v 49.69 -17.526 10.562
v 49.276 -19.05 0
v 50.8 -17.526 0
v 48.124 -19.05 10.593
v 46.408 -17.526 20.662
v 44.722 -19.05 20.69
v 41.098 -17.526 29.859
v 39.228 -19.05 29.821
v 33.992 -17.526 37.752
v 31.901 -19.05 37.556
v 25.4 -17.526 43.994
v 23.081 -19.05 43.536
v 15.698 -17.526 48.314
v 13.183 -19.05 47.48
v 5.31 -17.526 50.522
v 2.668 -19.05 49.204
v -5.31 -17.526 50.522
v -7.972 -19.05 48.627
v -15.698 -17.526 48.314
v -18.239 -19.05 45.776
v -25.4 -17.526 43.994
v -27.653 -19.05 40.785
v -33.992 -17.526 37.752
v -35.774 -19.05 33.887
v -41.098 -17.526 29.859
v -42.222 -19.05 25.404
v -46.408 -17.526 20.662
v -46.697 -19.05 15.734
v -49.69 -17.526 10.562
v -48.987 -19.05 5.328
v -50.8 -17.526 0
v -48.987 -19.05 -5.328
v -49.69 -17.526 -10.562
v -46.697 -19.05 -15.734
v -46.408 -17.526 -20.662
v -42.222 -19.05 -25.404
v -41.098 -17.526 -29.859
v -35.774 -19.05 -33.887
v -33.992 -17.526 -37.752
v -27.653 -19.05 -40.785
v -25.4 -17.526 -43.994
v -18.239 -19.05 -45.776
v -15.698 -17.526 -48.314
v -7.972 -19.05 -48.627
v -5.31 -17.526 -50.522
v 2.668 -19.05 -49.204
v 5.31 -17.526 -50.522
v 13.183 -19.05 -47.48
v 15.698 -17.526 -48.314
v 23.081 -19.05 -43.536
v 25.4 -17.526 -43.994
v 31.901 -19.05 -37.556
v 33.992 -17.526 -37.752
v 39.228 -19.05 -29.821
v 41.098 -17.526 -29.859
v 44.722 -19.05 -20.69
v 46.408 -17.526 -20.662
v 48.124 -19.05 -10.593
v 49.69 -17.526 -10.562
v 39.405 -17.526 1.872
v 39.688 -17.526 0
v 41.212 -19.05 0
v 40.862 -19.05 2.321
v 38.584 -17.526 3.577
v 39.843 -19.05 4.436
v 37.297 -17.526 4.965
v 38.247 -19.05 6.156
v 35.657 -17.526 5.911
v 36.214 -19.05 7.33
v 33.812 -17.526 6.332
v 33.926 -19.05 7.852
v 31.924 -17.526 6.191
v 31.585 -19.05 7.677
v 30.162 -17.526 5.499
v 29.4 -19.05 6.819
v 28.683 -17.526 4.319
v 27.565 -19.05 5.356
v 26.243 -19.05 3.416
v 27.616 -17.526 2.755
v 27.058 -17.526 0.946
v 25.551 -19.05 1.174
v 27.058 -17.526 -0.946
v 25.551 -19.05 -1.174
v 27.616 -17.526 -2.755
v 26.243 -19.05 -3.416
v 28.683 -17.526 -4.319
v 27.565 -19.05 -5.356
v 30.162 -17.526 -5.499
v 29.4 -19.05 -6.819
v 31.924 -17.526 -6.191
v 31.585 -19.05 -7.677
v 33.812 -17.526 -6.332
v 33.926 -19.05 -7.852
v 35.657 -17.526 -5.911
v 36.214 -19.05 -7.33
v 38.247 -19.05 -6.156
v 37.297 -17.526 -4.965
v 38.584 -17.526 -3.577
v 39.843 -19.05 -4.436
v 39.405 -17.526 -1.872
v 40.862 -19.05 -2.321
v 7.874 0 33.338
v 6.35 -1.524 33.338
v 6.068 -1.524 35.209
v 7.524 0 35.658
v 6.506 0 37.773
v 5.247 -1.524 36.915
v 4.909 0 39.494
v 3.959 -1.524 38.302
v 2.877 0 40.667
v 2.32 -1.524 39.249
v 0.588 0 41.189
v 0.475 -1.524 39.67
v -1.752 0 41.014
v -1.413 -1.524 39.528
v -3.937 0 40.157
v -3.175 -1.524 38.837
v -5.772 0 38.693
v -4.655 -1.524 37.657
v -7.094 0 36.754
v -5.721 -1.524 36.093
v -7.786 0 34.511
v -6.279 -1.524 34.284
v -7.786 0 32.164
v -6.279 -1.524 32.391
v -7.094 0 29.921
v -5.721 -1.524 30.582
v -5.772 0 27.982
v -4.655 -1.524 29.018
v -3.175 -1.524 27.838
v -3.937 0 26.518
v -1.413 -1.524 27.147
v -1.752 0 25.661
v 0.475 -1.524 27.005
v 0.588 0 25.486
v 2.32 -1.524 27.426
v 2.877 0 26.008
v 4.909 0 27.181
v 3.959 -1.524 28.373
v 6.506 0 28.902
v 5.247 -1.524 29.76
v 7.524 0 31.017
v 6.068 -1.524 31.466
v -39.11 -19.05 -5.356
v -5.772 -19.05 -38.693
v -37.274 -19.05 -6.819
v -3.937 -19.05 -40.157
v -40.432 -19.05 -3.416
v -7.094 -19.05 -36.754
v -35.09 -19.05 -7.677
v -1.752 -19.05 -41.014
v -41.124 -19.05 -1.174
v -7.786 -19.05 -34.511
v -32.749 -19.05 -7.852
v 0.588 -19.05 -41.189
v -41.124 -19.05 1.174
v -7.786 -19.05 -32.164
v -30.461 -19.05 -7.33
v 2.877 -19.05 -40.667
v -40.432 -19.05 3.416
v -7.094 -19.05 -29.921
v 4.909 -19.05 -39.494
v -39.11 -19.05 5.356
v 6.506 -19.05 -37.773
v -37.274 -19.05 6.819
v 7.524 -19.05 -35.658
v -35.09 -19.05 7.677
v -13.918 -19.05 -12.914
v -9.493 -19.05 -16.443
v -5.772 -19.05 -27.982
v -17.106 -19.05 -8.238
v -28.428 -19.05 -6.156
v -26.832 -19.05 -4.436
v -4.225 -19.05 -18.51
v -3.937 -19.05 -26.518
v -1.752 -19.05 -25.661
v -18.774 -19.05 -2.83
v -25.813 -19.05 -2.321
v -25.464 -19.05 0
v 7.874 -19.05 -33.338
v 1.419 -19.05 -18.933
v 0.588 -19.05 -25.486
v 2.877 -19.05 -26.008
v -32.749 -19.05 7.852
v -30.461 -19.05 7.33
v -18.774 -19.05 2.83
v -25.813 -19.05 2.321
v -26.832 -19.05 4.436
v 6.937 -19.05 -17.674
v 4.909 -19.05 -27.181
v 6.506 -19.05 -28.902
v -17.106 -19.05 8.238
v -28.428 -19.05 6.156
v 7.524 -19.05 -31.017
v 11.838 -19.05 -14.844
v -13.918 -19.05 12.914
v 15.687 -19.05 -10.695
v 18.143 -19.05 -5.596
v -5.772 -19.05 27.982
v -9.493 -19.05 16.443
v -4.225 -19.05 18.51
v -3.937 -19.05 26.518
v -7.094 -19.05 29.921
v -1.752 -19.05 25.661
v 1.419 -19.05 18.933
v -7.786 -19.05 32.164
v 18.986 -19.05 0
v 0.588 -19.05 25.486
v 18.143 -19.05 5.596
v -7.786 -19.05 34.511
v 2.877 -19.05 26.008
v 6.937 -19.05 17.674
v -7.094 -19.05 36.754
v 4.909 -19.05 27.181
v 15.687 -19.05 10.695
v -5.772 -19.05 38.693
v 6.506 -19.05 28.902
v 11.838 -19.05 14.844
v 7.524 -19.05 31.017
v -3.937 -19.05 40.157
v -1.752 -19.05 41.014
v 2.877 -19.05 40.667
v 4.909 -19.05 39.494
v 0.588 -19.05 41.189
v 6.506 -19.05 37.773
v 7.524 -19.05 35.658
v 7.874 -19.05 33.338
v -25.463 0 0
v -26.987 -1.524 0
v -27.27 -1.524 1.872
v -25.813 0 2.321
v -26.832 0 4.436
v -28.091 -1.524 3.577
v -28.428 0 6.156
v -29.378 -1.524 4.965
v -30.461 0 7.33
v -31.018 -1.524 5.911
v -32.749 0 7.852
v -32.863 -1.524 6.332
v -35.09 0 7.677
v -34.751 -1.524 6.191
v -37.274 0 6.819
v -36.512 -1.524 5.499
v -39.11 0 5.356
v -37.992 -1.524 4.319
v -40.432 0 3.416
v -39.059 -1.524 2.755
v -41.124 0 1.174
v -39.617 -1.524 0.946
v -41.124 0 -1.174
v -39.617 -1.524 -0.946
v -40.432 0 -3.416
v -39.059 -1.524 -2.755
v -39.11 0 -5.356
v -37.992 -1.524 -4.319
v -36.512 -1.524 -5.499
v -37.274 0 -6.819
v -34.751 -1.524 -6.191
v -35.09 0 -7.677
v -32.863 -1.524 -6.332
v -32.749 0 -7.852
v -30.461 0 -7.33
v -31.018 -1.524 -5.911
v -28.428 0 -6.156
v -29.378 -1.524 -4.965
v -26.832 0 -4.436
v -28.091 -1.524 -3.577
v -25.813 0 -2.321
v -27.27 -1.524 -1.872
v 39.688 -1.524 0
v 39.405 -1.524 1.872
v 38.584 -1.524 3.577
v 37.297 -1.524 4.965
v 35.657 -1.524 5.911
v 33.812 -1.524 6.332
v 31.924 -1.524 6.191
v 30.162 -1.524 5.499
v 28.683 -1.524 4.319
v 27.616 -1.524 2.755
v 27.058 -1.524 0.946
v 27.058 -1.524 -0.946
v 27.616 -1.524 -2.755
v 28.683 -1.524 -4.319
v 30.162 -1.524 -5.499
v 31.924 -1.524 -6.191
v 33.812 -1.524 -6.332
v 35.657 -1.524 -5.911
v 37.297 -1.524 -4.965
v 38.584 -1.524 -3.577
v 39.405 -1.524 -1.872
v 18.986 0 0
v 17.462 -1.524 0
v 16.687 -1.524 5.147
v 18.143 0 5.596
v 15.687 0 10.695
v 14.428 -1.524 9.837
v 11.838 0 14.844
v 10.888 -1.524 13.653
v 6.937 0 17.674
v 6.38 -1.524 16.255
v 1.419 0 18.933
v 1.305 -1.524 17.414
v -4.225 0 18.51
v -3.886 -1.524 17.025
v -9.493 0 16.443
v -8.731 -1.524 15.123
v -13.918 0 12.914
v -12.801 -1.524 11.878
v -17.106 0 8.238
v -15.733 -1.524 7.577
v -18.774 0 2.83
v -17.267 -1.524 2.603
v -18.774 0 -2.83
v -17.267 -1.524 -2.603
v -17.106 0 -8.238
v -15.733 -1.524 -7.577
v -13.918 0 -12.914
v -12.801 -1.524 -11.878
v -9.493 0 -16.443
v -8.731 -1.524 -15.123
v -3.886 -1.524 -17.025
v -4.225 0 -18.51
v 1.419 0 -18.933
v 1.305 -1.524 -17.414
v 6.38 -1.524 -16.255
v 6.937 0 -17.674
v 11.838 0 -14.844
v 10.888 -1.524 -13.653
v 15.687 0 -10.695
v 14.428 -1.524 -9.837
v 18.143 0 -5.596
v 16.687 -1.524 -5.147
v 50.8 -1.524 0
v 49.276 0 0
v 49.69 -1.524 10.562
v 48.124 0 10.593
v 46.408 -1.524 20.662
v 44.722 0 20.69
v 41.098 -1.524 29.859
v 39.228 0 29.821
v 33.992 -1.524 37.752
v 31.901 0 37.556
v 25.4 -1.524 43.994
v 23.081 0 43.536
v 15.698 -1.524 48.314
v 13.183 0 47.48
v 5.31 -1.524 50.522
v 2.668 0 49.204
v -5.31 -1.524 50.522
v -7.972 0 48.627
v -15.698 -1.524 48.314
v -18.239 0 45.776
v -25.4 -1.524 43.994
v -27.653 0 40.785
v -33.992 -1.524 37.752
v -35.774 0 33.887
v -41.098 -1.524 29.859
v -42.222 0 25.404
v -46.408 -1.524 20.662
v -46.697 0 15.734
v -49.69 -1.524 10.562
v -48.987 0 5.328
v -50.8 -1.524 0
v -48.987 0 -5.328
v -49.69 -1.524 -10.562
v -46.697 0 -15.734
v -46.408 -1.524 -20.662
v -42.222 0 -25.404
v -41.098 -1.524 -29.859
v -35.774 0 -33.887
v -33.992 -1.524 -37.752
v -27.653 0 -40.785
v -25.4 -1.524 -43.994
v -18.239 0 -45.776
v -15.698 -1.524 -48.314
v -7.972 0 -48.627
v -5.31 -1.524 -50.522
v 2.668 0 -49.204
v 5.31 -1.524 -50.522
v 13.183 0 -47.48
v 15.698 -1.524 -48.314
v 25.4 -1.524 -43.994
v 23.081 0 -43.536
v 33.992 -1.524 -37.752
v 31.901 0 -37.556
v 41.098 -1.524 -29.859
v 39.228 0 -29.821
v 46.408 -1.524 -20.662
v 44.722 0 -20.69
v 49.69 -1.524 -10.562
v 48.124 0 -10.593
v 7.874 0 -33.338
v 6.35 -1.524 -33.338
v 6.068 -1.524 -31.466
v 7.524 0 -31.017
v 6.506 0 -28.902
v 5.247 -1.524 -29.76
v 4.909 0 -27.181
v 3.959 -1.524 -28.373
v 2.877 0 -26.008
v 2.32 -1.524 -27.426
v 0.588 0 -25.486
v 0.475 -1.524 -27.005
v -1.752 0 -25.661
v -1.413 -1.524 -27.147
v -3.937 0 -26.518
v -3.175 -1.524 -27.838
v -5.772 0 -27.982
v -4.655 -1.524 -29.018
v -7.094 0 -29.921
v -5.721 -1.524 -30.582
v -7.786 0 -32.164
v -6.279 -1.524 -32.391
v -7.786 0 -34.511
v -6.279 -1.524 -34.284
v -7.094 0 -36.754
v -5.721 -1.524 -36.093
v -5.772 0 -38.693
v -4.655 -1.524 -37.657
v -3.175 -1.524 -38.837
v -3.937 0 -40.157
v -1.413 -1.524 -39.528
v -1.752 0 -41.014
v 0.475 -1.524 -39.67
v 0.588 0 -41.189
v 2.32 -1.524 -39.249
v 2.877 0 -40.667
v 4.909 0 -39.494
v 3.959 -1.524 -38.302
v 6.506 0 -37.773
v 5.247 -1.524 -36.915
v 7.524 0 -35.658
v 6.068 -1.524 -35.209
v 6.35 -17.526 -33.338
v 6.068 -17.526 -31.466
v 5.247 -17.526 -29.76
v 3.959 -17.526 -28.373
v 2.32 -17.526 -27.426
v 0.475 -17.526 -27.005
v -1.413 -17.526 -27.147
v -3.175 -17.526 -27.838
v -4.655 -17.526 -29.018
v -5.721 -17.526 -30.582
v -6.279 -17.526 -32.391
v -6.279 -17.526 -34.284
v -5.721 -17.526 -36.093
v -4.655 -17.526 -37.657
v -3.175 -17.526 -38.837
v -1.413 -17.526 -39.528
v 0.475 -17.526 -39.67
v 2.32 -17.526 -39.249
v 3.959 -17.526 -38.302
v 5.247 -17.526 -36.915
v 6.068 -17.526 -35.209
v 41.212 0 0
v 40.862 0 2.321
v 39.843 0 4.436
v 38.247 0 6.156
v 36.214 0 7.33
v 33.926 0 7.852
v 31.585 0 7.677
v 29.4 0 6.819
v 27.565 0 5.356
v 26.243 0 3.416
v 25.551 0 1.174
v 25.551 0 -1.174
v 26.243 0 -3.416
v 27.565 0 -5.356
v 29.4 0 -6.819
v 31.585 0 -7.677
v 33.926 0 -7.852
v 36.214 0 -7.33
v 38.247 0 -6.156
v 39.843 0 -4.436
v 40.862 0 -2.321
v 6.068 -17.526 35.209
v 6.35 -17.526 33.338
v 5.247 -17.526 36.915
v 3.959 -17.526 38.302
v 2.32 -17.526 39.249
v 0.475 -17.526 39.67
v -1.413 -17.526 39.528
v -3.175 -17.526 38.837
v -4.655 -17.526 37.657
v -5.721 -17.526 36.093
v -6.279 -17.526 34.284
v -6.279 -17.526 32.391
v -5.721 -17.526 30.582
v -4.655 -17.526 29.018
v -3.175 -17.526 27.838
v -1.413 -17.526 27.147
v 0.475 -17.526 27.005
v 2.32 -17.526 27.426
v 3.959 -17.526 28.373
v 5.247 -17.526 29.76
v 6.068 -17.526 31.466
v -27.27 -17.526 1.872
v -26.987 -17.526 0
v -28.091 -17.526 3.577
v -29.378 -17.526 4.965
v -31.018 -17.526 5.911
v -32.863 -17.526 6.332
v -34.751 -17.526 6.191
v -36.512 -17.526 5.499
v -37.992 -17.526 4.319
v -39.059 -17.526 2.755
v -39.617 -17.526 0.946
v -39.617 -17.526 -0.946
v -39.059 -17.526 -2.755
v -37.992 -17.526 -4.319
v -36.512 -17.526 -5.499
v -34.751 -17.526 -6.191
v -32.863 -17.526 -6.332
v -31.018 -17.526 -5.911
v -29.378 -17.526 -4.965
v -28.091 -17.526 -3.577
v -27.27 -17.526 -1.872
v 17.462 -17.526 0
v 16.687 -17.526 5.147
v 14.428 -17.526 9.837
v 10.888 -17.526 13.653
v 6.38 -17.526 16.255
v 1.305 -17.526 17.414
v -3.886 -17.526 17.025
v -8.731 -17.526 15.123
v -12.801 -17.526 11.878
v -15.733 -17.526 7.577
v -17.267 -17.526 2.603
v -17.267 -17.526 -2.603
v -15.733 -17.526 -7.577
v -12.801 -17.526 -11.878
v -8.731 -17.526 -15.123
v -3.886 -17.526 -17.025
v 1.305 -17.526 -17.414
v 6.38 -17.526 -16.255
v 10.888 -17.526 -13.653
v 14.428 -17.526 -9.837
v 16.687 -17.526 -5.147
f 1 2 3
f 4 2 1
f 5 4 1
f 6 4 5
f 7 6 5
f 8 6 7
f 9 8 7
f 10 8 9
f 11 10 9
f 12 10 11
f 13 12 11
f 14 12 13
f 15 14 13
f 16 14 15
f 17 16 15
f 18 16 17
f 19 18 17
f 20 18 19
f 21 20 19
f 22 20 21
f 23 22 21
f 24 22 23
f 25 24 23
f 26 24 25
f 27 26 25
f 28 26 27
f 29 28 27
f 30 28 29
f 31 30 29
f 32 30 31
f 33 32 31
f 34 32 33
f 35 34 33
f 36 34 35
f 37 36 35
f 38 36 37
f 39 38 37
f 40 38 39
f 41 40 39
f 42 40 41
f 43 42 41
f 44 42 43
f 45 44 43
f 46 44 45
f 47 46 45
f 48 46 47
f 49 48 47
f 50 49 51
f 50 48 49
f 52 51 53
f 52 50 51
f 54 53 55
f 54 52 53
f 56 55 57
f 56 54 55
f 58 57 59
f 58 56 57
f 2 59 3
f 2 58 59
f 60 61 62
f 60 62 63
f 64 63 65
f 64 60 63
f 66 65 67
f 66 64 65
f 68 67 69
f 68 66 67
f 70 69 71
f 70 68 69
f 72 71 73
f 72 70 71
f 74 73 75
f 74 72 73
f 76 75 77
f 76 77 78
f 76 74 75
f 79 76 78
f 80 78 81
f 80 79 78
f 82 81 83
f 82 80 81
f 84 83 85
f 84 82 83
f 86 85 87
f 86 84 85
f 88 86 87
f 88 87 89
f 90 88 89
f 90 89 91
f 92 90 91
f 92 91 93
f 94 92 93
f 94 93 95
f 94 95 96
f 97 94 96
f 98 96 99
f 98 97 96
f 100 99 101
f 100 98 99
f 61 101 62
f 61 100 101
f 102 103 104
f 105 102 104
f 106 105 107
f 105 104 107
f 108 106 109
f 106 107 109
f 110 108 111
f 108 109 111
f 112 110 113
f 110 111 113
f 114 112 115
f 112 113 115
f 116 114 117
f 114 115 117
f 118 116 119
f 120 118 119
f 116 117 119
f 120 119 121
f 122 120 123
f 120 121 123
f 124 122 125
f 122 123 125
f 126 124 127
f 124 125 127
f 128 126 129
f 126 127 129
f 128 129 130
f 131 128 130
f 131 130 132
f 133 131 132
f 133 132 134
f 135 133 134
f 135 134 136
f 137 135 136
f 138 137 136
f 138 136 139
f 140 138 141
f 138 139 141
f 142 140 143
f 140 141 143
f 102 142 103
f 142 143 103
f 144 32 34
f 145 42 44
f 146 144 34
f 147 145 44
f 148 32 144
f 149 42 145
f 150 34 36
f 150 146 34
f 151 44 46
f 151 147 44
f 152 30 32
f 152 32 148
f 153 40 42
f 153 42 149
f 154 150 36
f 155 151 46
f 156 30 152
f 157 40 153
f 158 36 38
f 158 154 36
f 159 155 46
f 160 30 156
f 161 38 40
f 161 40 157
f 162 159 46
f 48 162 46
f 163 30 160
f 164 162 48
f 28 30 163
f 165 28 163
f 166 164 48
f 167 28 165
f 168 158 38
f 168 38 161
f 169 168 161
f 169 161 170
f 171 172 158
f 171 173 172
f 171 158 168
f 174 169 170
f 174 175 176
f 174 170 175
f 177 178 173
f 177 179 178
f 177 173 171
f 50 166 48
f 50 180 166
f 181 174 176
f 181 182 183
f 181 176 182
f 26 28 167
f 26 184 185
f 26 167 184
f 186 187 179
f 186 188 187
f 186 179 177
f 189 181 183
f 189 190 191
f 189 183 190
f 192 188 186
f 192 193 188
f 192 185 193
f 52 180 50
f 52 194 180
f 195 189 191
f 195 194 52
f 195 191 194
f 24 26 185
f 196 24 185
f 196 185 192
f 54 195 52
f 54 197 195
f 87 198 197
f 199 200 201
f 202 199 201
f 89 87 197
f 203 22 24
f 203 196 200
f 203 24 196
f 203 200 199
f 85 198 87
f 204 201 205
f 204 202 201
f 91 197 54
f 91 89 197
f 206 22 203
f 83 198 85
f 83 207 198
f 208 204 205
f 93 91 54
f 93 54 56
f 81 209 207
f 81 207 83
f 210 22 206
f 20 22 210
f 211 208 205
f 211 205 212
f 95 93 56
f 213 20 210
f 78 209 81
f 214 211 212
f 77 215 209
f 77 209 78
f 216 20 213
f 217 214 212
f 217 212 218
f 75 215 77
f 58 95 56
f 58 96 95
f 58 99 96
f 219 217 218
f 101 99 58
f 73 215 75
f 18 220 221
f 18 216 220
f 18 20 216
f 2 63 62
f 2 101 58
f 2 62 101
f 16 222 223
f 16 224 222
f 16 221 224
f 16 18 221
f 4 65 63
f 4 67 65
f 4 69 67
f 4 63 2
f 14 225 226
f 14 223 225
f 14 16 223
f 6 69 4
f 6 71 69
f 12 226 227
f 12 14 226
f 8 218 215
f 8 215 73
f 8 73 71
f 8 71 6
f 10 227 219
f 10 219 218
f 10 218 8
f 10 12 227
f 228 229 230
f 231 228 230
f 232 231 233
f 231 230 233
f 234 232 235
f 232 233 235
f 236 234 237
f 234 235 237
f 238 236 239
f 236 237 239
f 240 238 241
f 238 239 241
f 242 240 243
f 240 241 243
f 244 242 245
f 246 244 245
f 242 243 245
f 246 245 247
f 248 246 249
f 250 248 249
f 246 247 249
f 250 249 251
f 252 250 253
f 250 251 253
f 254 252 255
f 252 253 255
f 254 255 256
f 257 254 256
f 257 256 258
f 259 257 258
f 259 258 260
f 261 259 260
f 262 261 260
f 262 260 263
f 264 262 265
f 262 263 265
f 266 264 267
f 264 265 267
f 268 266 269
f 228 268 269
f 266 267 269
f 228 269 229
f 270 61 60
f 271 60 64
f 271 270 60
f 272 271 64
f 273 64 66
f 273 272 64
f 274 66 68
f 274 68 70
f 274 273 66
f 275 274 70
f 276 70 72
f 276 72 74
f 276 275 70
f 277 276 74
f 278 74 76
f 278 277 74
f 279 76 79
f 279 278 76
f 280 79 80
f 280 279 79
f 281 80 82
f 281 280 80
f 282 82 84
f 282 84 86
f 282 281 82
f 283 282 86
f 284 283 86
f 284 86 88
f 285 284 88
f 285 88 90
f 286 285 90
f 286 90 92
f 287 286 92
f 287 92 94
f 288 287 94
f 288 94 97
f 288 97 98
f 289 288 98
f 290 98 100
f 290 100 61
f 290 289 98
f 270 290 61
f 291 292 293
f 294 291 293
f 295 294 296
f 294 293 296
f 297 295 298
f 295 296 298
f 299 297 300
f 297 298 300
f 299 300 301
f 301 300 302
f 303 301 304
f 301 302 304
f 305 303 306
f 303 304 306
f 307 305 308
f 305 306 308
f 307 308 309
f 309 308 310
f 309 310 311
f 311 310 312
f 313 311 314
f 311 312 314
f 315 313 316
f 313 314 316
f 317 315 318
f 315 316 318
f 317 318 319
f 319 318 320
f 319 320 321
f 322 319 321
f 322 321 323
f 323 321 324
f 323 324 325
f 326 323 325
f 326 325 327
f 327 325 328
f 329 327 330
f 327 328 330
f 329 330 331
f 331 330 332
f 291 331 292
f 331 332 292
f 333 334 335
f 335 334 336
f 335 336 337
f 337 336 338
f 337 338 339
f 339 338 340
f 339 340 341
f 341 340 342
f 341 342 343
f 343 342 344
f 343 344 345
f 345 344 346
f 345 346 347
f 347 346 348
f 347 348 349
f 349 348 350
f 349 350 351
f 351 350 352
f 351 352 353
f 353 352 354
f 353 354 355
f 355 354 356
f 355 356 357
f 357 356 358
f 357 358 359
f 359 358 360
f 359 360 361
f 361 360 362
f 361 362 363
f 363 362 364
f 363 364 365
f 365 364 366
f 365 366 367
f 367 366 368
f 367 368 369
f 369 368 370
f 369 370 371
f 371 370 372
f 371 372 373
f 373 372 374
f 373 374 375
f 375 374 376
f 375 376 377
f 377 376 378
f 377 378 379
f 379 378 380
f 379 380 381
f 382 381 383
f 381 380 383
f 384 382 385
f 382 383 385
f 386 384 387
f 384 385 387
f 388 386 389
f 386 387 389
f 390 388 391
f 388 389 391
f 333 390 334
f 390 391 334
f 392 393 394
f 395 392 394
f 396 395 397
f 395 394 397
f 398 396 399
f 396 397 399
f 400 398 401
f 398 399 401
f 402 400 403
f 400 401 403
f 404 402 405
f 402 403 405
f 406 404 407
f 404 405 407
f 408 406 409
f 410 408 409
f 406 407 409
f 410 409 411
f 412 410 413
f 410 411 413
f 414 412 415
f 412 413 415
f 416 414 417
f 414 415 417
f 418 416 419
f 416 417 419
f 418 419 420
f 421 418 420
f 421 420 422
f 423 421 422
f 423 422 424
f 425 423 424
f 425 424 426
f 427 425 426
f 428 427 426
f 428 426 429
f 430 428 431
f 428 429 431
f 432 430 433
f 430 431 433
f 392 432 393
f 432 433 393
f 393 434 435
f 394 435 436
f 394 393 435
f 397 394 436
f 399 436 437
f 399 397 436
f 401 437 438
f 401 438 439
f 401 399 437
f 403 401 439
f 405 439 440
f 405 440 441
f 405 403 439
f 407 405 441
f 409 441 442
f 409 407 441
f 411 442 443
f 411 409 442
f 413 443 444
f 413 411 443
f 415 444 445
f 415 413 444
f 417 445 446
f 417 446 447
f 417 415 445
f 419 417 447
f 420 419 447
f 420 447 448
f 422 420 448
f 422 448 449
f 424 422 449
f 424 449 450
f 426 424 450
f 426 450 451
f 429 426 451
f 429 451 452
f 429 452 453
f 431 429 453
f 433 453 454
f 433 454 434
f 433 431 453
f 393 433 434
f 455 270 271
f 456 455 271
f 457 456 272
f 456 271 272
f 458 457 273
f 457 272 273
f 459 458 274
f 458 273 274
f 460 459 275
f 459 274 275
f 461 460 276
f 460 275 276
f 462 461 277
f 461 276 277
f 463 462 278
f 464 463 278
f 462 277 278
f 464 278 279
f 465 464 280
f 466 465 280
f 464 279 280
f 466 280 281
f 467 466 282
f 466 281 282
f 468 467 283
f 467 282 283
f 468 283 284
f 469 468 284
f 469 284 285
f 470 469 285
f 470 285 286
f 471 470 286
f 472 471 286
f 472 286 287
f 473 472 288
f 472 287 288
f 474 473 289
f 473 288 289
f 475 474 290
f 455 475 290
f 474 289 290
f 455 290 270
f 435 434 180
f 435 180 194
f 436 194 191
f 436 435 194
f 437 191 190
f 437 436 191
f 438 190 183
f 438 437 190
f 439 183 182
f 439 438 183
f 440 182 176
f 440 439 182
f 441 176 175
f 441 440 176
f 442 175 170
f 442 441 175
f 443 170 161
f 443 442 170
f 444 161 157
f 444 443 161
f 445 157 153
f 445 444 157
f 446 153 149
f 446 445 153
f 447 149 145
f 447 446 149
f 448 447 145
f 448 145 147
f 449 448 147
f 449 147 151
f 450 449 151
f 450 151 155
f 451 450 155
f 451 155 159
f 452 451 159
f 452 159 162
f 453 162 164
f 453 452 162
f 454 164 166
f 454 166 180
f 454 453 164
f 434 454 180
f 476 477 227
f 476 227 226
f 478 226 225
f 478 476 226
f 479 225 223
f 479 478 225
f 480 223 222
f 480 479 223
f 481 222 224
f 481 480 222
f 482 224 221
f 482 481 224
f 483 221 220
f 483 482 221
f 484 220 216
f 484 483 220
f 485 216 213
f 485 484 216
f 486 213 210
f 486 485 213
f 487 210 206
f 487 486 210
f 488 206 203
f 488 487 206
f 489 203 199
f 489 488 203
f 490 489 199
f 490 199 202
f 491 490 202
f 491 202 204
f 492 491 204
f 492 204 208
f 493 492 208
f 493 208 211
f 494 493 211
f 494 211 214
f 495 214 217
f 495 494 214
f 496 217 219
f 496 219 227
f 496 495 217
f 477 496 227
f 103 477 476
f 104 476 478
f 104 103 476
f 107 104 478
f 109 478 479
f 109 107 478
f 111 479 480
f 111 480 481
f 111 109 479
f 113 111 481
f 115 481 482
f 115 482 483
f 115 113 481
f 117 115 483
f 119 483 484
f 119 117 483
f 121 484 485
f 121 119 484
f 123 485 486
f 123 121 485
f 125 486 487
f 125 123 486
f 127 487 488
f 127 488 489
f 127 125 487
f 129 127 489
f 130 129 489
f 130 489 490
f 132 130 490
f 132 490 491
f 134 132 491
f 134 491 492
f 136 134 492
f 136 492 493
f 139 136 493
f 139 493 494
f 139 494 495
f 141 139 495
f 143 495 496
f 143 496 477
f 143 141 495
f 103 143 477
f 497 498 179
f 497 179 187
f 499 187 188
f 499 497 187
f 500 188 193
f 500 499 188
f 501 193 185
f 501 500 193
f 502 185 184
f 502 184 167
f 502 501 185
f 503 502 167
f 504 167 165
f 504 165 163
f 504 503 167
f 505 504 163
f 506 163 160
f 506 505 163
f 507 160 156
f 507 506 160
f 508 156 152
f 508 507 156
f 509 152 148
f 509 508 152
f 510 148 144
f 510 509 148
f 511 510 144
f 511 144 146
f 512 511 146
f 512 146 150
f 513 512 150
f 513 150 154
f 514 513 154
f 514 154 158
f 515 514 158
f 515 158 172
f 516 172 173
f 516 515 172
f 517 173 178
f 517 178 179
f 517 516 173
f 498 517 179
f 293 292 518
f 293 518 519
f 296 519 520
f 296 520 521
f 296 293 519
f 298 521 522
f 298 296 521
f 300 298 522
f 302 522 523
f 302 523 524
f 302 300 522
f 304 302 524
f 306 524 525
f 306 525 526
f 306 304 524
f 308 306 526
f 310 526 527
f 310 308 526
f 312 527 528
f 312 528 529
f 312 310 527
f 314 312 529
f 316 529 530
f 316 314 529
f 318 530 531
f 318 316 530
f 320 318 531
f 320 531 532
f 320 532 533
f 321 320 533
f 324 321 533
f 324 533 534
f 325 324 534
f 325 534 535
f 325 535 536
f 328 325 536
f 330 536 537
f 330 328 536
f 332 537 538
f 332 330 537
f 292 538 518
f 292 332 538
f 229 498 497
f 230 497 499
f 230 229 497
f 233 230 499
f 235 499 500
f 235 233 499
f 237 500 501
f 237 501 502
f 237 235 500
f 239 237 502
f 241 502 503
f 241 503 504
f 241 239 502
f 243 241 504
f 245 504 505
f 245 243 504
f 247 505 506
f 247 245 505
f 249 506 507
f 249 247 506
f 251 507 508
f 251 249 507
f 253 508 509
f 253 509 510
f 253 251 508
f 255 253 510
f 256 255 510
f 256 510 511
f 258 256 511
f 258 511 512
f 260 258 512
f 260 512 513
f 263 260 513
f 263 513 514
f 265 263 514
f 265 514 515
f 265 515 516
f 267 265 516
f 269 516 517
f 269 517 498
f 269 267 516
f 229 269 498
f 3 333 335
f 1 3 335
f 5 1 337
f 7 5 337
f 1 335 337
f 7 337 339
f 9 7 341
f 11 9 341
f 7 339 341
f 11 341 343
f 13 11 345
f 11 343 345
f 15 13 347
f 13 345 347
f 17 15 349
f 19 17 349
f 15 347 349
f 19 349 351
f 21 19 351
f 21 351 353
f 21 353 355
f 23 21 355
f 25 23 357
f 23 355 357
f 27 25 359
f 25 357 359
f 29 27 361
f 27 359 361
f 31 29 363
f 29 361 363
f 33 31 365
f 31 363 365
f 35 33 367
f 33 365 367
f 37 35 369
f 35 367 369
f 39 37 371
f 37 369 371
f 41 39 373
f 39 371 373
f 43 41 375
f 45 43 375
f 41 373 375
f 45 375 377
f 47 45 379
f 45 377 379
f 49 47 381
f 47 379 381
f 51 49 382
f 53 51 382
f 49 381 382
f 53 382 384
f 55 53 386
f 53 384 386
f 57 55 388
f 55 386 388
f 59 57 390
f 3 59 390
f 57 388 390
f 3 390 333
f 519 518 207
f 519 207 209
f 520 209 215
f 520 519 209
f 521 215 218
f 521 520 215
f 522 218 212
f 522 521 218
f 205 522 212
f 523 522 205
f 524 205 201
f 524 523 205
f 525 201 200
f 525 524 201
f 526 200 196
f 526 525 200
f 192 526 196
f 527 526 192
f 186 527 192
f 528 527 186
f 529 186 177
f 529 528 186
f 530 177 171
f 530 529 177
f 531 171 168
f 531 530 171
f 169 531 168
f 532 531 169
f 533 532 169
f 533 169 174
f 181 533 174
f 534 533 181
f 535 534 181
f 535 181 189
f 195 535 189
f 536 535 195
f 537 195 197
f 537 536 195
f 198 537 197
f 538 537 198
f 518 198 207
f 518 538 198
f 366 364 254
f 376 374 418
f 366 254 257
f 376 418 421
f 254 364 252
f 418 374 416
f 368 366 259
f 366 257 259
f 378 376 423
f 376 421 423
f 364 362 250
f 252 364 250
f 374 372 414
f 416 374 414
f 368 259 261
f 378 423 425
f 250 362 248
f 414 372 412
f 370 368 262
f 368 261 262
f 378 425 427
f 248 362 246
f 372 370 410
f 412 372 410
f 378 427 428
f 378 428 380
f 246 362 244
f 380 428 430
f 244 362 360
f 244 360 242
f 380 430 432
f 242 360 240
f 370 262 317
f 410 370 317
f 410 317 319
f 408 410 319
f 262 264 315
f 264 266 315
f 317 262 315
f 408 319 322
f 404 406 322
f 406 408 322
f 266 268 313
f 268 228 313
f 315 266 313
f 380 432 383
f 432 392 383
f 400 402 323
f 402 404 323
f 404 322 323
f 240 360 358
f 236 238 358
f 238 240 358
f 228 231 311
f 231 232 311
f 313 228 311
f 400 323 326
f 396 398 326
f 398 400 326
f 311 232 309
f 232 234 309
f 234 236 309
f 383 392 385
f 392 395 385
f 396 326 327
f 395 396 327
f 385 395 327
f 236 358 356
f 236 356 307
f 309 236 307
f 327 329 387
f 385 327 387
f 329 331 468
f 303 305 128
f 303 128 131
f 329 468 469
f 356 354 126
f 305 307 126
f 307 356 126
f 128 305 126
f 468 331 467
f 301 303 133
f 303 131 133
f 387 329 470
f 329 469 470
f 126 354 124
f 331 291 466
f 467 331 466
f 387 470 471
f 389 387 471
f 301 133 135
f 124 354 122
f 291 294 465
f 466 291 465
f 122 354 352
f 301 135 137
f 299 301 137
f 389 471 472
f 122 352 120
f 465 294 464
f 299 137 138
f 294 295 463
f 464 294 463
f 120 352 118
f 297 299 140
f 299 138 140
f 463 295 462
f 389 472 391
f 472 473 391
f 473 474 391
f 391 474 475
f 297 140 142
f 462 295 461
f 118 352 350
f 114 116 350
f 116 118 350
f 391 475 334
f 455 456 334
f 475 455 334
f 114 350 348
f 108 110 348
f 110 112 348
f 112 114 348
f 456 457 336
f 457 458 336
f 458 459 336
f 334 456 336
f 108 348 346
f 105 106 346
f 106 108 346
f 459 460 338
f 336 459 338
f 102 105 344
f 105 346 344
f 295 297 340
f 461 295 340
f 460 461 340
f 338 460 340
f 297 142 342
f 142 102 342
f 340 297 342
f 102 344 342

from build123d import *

# Parameters (mm, degrees)
F0_R     = 50.8
F0_R_2   = 6.35
F0_R_3   = 17.4625
F1_DEPTH = 19.05
F2_SIZE  = 1.524
F3_SIZE  = 1.524
F4_SIZE  = 1.524
F5_SIZE  = 1.524
F6_SIZE  = 1.524
F7_SIZE  = 1.524
F8_SIZE  = 1.524
F9_SIZE  = 1.524


with BuildPart() as f1:
    # F0 (on Front) → F1 (new body)
    with BuildSketch(Plane.XZ):
        Circle(F0_R)
        with Locations((0, -33.3375)):
            Circle(F0_R_2, mode=Mode.SUBTRACT)
        with Locations((-33.3375, 0)):
            Circle(F0_R_2, mode=Mode.SUBTRACT)
        Circle(F0_R_3, mode=Mode.SUBTRACT)
        with Locations((33.3375, 0)):
            Circle(F0_R_2, mode=Mode.SUBTRACT)
        with Locations((0, 33.3375)):
            Circle(F0_R_2, mode=Mode.SUBTRACT)
    extrude(amount=F1_DEPTH)

    # F2
    f2_edges = [f1.edges().sort_by_distance(p)[0] for p in [
        (-50.8, -19.05, 0),
    ]]
    chamfer(f2_edges, length=F2_SIZE)

    # F3
    f3_edges = [f1.edges().sort_by_distance(p)[0] for p in [
        (-6.35, -19.05, 33.3375),
    ]]
    chamfer(f3_edges, length=F3_SIZE)

    # F4
    f4_edges = [f1.edges().sort_by_distance(p)[0] for p in [
        (-39.6875, -19.05, 0),
    ]]
    chamfer(f4_edges, length=F4_SIZE)

    # F5
    f5_edges = [f1.edges().sort_by_distance(p)[0] for p in [
        (-6.35, -19.05, -33.3375),
    ]]
    chamfer(f5_edges, length=F5_SIZE)

    # F6
    f6_edges = [f1.edges().sort_by_distance(p)[0] for p in [
        (26.9875, -19.05, 0),
    ]]
    chamfer(f6_edges, length=F6_SIZE)

    # F7
    f7_edges = [f1.edges().sort_by_distance(p)[0] for p in [
        (-17.4625, -19.05, 0),
    ]]
    chamfer(f7_edges, length=F7_SIZE)

    # F8
    f8_edges = [f1.edges().sort_by_distance(p)[0] for p in [
        (-50.8, 0, 0),
    ]]
    chamfer(f8_edges, length=F8_SIZE)

    # F9
    f9_edges = [f1.edges().sort_by_distance(p)[0] for p in [
        (-6.35, 0, -33.3375),
        (26.9875, 0, 0),
        (-6.35, 0, 33.3375),
        (-39.6875, 0, 0),
        (-17.4625, 0, 0),
    ]]
    chamfer(f9_edges, length=F9_SIZE)


solid = f1.part
